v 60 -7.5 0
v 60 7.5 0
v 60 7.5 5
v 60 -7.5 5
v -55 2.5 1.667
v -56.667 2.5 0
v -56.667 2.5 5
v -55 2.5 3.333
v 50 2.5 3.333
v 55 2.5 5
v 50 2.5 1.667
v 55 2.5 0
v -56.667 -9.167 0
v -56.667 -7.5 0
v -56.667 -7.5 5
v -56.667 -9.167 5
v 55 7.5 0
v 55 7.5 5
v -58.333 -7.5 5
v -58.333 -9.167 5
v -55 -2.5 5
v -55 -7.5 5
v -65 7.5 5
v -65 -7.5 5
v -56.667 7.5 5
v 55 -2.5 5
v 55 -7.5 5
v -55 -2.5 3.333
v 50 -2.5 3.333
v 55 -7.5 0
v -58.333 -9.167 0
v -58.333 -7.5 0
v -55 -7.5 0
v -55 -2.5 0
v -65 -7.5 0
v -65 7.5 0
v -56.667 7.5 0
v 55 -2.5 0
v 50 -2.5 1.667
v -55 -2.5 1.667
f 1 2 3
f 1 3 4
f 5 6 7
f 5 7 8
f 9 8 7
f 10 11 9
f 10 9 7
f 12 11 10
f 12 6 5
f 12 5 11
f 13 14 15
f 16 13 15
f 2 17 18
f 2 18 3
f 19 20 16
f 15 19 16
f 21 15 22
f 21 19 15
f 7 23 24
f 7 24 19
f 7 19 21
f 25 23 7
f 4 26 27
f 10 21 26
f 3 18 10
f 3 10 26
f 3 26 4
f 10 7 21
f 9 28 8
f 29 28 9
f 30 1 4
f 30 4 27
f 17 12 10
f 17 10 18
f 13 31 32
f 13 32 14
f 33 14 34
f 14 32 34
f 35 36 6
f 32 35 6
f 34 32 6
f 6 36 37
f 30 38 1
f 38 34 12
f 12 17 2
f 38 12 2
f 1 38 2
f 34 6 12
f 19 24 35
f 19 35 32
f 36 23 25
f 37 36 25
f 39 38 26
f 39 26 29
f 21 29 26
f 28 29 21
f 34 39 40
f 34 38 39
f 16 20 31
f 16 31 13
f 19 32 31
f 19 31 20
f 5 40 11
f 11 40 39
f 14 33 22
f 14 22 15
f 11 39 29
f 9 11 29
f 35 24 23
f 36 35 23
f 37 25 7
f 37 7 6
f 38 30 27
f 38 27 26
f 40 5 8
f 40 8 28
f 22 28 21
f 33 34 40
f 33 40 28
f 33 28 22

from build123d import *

# Parameters (mm, degrees)
SLIDER_MAIN_BODY_DEPTH = 5
SKETCH2_W              = 1.666666666
SKETCH2_H              = 5
TRACK_SLIDER_DEPTH     = 1.666666667
SKETCH3_W              = 5
SKETCH3_H              = 15
HANDLE_DEPTH           = 5
SKETCH4_W              = 105
SKETCH4_H              = 1.666666666
CUT_EXTRUDE1_DEPTH     = 66.954529791
SKETCH5_W              = 1.666666667
SKETCH5_H              = 5
CUT_EXTRUDE2_DEPTH     = 5


with BuildPart() as part:
    # Sketch1 → Slider Main Body (new body)
    with BuildSketch(Plane.XY):
        Polygon((-55, 7.5), (-55, 2.5), (55, 2.5), (55, 7.5), (60, 7.5), (60, -7.5), (55, -7.5), (55, -2.5), (-55, -2.5), (-55, -7.5), (-60, -7.5), (-60, 7.5), align=None)
    extrude(amount=SLIDER_MAIN_BODY_DEPTH)

    # Sketch2 → Track Slider (add)
    with BuildSketch(Plane.XZ.offset(7.5)):
        with Locations((-57.5, 2.5)):
            Rectangle(SKETCH2_W, SKETCH2_H)
    extrude(amount=TRACK_SLIDER_DEPTH)

    # Sketch3 → Handle (add)
    with BuildSketch(Plane.XY.offset(5)):
        with Locations((-62.5, 0)):
            Rectangle(SKETCH3_W, SKETCH3_H)
    extrude(amount=-HANDLE_DEPTH)

    # Sketch4 → Cut-Extrude1 (cut, through all)
    with BuildSketch(Plane.XZ.offset(2.5)):
        with Locations((-2.5, 2.5)):
            Rectangle(SKETCH4_W, SKETCH4_H)
    extrude(amount=-CUT_EXTRUDE1_DEPTH, mode=Mode.SUBTRACT)

    # Sketch5 → Cut-Extrude2 (cut)
    with BuildSketch(Plane(origin=(0, 7.5, 0), x_dir=(1, 0, 0), z_dir=(0, 1, 0))):
        with Locations((-55.833333334, -2.5)):
            Rectangle(SKETCH5_W, SKETCH5_H)
    extrude(amount=-CUT_EXTRUDE2_DEPTH, mode=Mode.SUBTRACT)


solid = part.part
